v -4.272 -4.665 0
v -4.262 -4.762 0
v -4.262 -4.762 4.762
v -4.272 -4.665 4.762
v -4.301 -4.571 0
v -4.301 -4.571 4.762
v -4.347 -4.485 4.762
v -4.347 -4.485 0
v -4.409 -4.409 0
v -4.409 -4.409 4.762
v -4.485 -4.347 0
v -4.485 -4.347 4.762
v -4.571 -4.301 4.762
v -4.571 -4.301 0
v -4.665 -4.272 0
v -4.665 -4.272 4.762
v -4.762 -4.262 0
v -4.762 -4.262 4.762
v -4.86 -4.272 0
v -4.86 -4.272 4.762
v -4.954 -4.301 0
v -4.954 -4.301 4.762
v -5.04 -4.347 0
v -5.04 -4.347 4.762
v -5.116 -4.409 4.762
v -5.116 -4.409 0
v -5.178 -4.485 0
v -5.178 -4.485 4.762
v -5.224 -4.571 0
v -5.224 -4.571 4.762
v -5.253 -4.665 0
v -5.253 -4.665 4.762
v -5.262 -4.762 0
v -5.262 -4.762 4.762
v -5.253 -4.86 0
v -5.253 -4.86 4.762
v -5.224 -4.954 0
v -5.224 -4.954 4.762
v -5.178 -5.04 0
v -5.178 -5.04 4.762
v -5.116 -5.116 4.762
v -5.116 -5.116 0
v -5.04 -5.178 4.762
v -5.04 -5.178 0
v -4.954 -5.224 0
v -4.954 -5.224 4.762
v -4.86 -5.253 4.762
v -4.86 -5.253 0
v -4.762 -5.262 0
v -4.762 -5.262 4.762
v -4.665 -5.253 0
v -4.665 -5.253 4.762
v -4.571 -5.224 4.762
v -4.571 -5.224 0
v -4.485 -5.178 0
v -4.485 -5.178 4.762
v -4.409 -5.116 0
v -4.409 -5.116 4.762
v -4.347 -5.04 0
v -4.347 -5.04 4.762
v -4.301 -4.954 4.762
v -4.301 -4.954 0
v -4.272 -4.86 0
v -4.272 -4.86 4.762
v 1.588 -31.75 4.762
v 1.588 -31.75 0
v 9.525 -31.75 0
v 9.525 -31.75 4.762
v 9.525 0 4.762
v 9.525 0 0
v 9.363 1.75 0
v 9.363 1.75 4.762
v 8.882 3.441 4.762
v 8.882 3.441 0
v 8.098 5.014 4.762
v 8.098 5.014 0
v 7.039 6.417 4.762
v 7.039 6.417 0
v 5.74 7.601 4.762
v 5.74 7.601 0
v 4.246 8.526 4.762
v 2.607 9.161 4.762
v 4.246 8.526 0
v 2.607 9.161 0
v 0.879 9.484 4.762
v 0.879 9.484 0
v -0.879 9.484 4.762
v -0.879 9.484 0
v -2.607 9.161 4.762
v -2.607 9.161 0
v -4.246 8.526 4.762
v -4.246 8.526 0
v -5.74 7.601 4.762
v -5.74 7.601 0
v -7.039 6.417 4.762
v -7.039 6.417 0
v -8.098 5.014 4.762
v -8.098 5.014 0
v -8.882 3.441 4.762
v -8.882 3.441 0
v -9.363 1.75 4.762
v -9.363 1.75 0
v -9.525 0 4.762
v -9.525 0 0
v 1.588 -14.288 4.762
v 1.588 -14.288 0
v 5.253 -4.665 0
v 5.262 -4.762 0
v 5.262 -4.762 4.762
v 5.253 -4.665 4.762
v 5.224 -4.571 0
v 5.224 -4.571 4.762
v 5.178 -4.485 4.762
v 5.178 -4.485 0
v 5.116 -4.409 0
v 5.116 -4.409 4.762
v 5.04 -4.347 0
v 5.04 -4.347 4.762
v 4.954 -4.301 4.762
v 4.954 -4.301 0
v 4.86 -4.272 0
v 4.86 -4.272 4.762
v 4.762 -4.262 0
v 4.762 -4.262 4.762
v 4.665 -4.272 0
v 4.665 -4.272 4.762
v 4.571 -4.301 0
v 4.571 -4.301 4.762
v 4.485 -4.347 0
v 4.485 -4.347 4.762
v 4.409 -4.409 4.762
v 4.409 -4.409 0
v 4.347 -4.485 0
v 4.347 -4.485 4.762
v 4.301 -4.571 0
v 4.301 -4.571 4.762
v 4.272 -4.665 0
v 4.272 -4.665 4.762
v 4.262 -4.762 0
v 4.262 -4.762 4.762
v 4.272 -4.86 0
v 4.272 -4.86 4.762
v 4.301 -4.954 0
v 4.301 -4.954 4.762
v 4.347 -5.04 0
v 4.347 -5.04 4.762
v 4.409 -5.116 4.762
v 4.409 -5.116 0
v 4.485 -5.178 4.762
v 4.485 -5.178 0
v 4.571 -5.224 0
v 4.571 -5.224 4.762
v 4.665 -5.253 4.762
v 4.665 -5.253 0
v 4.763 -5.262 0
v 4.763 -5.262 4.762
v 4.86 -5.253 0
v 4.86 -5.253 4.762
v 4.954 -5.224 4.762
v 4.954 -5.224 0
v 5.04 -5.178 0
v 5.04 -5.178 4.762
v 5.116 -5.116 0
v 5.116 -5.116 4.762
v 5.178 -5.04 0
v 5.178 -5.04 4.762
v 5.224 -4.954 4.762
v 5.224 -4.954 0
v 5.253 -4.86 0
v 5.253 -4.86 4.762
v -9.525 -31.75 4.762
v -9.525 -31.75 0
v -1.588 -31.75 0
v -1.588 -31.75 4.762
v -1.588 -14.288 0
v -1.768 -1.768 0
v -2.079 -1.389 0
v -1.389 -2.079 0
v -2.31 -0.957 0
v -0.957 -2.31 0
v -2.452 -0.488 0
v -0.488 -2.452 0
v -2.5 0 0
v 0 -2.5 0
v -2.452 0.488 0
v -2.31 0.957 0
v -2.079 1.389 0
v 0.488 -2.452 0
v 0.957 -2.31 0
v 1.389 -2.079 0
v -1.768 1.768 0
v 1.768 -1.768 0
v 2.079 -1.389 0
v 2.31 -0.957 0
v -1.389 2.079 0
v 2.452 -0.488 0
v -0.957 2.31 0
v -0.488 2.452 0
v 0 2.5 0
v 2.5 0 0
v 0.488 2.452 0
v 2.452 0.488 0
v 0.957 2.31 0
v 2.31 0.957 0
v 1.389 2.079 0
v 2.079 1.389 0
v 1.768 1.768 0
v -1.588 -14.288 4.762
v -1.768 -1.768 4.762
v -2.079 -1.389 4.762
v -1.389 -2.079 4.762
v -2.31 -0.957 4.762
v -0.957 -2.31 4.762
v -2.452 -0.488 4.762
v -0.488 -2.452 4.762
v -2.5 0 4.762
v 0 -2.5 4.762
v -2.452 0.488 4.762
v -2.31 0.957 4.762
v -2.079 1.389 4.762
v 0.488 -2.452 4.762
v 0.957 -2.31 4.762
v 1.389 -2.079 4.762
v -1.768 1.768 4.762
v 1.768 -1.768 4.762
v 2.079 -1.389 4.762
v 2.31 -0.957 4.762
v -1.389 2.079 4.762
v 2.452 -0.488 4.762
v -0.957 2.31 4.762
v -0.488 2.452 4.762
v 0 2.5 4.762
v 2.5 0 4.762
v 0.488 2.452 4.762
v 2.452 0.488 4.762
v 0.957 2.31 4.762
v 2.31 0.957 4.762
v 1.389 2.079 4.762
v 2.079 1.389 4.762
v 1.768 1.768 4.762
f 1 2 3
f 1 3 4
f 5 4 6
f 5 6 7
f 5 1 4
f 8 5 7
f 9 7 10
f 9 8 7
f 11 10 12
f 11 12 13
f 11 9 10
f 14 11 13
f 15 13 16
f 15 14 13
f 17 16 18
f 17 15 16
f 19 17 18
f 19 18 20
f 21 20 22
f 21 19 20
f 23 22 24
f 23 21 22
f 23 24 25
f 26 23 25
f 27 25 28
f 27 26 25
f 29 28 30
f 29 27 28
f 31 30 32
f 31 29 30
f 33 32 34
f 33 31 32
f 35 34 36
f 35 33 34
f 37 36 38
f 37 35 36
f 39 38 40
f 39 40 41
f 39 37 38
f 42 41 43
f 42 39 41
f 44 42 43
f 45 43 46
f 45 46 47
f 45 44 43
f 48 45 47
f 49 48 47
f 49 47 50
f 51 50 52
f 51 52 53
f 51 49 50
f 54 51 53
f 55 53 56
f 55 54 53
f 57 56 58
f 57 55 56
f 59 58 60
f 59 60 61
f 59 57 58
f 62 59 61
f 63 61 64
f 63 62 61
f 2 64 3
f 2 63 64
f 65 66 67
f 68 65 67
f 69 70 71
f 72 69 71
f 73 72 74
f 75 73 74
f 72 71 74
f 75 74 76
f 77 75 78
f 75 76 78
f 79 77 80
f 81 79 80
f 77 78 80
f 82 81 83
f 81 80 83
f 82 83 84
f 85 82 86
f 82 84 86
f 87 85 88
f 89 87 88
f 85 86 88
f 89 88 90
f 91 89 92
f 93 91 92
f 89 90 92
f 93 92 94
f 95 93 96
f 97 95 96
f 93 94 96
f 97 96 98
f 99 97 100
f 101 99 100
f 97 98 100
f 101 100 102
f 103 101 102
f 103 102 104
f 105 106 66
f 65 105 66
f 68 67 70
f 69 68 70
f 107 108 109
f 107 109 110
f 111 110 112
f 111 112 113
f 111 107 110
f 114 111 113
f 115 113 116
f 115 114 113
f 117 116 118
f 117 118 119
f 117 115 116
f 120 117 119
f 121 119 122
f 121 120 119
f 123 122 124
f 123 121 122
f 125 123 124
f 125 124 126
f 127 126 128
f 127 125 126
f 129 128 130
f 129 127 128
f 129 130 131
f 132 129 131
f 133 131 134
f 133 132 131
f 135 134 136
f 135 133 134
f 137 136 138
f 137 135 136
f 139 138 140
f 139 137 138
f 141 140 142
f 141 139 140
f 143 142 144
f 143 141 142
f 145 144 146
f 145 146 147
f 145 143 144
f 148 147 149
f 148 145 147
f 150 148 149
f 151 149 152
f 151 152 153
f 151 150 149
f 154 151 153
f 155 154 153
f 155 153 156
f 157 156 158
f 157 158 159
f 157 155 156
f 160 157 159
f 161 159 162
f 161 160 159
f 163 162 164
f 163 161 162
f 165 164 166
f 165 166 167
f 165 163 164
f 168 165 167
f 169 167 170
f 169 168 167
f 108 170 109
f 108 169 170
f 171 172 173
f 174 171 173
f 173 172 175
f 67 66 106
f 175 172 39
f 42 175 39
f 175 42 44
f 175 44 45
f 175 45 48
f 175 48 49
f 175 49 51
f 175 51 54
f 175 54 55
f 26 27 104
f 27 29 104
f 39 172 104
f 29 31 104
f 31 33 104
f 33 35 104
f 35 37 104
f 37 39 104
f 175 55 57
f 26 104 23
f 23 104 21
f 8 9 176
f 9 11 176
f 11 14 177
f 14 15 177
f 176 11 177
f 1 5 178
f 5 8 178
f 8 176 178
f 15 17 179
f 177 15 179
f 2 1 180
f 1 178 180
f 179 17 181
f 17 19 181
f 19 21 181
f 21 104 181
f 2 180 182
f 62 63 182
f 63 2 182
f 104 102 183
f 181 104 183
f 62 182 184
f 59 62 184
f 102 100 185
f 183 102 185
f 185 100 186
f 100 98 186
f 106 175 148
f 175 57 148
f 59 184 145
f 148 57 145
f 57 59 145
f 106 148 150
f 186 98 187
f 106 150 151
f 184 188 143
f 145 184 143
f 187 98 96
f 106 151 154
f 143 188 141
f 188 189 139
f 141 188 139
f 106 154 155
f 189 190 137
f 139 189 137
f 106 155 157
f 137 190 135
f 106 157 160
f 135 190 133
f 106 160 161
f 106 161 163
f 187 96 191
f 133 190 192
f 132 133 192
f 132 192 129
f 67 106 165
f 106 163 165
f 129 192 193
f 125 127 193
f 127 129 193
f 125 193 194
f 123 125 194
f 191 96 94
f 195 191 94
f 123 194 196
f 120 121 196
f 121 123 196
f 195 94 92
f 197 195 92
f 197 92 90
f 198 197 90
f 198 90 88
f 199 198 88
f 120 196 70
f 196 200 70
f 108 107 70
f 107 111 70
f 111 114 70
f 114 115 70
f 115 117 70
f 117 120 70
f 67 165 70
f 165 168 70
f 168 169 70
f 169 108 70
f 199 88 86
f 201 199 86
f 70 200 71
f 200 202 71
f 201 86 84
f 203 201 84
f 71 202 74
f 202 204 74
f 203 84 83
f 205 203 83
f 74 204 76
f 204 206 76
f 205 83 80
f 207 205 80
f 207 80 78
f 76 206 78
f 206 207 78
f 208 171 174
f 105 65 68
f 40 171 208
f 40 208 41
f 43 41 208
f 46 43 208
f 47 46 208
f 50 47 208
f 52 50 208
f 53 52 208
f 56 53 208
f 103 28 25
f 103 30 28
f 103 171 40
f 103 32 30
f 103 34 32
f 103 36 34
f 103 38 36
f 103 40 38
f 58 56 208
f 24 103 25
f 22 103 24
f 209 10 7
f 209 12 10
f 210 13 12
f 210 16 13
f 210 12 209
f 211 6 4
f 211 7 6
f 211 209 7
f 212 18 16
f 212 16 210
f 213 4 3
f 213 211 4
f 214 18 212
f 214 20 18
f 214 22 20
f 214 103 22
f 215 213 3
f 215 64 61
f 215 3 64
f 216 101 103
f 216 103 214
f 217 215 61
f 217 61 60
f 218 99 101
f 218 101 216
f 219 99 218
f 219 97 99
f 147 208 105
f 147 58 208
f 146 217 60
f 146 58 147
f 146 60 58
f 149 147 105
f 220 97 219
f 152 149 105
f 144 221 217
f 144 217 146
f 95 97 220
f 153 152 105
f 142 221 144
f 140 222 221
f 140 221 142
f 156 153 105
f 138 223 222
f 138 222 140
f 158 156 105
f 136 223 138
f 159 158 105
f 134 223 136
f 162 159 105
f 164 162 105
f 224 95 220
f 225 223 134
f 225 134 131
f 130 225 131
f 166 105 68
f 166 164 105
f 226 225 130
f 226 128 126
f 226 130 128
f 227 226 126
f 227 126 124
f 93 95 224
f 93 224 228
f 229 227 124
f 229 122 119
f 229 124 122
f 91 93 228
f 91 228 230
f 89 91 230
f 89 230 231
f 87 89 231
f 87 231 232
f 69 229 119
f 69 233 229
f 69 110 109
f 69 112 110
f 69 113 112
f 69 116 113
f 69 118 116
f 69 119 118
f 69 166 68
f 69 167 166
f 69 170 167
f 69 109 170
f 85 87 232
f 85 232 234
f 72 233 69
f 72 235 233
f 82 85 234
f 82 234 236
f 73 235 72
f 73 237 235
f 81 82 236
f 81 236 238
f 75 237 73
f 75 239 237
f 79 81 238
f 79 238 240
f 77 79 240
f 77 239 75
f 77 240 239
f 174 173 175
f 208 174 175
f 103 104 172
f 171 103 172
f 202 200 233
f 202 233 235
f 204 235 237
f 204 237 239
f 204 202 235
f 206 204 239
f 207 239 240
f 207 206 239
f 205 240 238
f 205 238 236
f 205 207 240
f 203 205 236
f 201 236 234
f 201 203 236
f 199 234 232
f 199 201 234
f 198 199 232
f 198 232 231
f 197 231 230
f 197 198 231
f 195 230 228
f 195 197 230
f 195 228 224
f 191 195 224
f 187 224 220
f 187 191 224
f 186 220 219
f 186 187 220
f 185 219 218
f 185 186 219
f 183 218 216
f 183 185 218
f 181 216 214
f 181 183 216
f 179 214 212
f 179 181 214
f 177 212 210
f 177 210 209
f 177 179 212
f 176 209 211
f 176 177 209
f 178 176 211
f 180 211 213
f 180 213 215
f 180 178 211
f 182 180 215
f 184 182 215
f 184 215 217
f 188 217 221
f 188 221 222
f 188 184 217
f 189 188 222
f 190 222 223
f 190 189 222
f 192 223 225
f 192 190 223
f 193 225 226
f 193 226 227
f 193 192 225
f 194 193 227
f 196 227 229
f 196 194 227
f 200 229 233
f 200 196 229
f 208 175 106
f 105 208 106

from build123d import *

# Parameters (mm, degrees)
F0_R     = 0.5
F0_R_2   = 2.5
F1_DEPTH = 4.7625


with BuildPart() as f1:
    # F0 (on Top) → F1 (new body)
    with BuildSketch(Plane.XY):
        with BuildLine():
            Line((9.525, -31.75), (9.525, 0))
            ThreePointArc((9.525, 0), (0, 9.525), (-9.525, 0))
            Line((-9.525, 0), (-9.525, -31.75))
            Line((-9.525, -31.75), (-1.5875, -31.75))
            Line((-1.5875, -31.75), (-1.5875, -14.2875))
            Line((-1.5875, -14.2875), (1.5875, -14.2875))
            Line((1.5875, -14.2875), (1.5875, -31.75))
            Line((1.5875, -31.75), (9.525, -31.75))
        make_face()
        with Locations((-4.7625, -4.7625)):
            Circle(F0_R, mode=Mode.SUBTRACT)
        with Locations((4.7625, -4.7625)):
            Circle(F0_R, mode=Mode.SUBTRACT)
        Circle(F0_R_2, mode=Mode.SUBTRACT)
    extrude(amount=F1_DEPTH)


solid = f1.part
